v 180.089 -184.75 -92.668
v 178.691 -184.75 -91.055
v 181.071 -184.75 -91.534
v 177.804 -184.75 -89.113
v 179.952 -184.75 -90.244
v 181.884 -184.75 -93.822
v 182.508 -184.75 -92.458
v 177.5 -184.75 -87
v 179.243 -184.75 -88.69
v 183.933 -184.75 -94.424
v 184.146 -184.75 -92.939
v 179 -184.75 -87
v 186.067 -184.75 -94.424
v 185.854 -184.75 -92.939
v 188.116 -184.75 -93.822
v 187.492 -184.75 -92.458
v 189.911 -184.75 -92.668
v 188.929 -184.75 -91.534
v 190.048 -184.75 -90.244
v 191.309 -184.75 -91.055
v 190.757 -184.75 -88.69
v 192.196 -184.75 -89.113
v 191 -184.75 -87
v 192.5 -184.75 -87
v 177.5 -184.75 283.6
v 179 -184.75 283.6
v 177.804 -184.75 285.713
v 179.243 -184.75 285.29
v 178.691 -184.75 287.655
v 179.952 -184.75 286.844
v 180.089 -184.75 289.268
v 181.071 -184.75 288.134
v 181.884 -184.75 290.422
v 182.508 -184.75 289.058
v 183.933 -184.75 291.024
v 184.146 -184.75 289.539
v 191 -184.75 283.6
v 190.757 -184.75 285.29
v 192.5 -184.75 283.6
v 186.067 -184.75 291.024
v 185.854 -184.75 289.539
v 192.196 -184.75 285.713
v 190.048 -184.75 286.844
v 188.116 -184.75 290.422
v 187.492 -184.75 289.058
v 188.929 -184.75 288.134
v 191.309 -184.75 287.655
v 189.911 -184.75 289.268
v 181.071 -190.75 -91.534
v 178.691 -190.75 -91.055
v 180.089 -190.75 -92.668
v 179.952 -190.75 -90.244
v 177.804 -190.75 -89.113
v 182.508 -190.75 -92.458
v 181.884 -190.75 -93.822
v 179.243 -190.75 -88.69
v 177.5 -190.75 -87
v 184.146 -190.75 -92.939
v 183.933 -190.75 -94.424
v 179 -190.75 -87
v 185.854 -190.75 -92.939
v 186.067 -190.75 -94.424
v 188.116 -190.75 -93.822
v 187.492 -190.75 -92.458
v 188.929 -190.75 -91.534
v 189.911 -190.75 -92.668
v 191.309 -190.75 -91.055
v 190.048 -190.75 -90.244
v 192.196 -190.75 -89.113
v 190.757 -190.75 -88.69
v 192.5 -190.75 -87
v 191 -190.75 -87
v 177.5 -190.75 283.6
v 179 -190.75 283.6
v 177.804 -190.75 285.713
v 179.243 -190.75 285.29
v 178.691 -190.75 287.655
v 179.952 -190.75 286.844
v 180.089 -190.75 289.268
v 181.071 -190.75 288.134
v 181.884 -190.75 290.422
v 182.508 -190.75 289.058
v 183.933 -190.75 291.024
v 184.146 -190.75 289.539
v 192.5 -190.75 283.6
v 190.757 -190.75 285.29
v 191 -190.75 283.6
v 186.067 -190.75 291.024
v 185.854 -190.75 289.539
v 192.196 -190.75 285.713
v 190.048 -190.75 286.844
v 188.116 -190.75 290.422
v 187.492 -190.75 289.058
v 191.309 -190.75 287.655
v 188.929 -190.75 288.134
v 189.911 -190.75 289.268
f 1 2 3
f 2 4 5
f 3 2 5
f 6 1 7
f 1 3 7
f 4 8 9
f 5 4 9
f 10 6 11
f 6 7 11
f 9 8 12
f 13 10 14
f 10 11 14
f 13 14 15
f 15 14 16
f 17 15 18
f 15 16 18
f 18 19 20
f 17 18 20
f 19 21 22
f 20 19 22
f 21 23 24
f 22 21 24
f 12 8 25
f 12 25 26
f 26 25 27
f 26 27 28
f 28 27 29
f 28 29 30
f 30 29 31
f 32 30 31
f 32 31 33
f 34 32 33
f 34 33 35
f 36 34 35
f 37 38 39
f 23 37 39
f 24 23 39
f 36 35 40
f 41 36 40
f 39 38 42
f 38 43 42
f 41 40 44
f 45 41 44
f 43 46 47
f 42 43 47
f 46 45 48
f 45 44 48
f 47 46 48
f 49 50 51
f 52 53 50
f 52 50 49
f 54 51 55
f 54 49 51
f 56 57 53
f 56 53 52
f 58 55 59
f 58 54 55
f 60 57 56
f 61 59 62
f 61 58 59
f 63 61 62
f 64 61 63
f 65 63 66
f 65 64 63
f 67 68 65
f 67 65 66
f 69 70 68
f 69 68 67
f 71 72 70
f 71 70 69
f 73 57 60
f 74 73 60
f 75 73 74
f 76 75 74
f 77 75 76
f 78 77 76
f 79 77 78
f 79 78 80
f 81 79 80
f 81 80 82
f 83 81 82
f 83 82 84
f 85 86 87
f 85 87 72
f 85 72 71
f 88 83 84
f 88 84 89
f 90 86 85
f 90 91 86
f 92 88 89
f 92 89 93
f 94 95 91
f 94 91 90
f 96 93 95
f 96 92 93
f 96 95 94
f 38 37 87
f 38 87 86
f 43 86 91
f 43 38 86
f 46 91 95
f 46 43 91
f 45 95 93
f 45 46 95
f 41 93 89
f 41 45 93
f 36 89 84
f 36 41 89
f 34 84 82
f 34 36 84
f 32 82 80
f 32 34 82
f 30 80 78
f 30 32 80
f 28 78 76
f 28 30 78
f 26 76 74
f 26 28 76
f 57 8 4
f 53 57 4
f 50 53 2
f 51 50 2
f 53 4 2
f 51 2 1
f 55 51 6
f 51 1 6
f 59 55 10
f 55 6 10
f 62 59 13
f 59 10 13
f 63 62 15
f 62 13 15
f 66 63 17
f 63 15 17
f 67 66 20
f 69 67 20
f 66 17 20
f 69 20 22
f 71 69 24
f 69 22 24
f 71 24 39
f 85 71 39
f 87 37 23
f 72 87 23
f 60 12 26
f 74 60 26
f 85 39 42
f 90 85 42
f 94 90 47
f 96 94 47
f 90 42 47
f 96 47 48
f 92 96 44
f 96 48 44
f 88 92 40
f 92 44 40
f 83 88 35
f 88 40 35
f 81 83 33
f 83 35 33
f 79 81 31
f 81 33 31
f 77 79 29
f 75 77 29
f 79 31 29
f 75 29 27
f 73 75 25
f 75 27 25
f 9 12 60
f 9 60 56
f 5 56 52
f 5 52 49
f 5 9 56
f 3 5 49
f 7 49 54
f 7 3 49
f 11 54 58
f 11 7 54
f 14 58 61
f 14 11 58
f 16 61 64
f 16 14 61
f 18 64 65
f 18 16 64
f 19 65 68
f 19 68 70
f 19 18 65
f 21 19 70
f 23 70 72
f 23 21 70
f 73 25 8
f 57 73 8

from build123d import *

# Parameters (mm, degrees)
PAD_DEPTH = 6


with BuildPart() as part:
    # Sketch → Pad (new body)
    with BuildSketch(Plane.XZ):
        with BuildLine():
            ThreePointArc((7.5, 370.6), (0, 378.1), (-7.5, 370.6))
            Line((-7.5, 370.6), (-7.5, 0))
            ThreePointArc((-7.5, 0), (0, -7.5), (7.5, 0))
            Line((7.5, 0), (7.5, 370.6))
        make_face()
        with BuildLine():
            ThreePointArc((-6, 0), (0, -6), (6, 0))
            Line((6, 370.6), (6, 0))
            ThreePointArc((6, 370.6), (0, 376.6), (-6, 370.600001))
            Line((-6, 0), (-6, 370.600001))
        make_face(mode=Mode.SUBTRACT)
    extrude(amount=PAD_DEPTH)


with BuildPart() as part_1:
    # Body placement: moved
    add(part.part.moved(Location((185, -184.75, -87))))


solid = part_1.part
